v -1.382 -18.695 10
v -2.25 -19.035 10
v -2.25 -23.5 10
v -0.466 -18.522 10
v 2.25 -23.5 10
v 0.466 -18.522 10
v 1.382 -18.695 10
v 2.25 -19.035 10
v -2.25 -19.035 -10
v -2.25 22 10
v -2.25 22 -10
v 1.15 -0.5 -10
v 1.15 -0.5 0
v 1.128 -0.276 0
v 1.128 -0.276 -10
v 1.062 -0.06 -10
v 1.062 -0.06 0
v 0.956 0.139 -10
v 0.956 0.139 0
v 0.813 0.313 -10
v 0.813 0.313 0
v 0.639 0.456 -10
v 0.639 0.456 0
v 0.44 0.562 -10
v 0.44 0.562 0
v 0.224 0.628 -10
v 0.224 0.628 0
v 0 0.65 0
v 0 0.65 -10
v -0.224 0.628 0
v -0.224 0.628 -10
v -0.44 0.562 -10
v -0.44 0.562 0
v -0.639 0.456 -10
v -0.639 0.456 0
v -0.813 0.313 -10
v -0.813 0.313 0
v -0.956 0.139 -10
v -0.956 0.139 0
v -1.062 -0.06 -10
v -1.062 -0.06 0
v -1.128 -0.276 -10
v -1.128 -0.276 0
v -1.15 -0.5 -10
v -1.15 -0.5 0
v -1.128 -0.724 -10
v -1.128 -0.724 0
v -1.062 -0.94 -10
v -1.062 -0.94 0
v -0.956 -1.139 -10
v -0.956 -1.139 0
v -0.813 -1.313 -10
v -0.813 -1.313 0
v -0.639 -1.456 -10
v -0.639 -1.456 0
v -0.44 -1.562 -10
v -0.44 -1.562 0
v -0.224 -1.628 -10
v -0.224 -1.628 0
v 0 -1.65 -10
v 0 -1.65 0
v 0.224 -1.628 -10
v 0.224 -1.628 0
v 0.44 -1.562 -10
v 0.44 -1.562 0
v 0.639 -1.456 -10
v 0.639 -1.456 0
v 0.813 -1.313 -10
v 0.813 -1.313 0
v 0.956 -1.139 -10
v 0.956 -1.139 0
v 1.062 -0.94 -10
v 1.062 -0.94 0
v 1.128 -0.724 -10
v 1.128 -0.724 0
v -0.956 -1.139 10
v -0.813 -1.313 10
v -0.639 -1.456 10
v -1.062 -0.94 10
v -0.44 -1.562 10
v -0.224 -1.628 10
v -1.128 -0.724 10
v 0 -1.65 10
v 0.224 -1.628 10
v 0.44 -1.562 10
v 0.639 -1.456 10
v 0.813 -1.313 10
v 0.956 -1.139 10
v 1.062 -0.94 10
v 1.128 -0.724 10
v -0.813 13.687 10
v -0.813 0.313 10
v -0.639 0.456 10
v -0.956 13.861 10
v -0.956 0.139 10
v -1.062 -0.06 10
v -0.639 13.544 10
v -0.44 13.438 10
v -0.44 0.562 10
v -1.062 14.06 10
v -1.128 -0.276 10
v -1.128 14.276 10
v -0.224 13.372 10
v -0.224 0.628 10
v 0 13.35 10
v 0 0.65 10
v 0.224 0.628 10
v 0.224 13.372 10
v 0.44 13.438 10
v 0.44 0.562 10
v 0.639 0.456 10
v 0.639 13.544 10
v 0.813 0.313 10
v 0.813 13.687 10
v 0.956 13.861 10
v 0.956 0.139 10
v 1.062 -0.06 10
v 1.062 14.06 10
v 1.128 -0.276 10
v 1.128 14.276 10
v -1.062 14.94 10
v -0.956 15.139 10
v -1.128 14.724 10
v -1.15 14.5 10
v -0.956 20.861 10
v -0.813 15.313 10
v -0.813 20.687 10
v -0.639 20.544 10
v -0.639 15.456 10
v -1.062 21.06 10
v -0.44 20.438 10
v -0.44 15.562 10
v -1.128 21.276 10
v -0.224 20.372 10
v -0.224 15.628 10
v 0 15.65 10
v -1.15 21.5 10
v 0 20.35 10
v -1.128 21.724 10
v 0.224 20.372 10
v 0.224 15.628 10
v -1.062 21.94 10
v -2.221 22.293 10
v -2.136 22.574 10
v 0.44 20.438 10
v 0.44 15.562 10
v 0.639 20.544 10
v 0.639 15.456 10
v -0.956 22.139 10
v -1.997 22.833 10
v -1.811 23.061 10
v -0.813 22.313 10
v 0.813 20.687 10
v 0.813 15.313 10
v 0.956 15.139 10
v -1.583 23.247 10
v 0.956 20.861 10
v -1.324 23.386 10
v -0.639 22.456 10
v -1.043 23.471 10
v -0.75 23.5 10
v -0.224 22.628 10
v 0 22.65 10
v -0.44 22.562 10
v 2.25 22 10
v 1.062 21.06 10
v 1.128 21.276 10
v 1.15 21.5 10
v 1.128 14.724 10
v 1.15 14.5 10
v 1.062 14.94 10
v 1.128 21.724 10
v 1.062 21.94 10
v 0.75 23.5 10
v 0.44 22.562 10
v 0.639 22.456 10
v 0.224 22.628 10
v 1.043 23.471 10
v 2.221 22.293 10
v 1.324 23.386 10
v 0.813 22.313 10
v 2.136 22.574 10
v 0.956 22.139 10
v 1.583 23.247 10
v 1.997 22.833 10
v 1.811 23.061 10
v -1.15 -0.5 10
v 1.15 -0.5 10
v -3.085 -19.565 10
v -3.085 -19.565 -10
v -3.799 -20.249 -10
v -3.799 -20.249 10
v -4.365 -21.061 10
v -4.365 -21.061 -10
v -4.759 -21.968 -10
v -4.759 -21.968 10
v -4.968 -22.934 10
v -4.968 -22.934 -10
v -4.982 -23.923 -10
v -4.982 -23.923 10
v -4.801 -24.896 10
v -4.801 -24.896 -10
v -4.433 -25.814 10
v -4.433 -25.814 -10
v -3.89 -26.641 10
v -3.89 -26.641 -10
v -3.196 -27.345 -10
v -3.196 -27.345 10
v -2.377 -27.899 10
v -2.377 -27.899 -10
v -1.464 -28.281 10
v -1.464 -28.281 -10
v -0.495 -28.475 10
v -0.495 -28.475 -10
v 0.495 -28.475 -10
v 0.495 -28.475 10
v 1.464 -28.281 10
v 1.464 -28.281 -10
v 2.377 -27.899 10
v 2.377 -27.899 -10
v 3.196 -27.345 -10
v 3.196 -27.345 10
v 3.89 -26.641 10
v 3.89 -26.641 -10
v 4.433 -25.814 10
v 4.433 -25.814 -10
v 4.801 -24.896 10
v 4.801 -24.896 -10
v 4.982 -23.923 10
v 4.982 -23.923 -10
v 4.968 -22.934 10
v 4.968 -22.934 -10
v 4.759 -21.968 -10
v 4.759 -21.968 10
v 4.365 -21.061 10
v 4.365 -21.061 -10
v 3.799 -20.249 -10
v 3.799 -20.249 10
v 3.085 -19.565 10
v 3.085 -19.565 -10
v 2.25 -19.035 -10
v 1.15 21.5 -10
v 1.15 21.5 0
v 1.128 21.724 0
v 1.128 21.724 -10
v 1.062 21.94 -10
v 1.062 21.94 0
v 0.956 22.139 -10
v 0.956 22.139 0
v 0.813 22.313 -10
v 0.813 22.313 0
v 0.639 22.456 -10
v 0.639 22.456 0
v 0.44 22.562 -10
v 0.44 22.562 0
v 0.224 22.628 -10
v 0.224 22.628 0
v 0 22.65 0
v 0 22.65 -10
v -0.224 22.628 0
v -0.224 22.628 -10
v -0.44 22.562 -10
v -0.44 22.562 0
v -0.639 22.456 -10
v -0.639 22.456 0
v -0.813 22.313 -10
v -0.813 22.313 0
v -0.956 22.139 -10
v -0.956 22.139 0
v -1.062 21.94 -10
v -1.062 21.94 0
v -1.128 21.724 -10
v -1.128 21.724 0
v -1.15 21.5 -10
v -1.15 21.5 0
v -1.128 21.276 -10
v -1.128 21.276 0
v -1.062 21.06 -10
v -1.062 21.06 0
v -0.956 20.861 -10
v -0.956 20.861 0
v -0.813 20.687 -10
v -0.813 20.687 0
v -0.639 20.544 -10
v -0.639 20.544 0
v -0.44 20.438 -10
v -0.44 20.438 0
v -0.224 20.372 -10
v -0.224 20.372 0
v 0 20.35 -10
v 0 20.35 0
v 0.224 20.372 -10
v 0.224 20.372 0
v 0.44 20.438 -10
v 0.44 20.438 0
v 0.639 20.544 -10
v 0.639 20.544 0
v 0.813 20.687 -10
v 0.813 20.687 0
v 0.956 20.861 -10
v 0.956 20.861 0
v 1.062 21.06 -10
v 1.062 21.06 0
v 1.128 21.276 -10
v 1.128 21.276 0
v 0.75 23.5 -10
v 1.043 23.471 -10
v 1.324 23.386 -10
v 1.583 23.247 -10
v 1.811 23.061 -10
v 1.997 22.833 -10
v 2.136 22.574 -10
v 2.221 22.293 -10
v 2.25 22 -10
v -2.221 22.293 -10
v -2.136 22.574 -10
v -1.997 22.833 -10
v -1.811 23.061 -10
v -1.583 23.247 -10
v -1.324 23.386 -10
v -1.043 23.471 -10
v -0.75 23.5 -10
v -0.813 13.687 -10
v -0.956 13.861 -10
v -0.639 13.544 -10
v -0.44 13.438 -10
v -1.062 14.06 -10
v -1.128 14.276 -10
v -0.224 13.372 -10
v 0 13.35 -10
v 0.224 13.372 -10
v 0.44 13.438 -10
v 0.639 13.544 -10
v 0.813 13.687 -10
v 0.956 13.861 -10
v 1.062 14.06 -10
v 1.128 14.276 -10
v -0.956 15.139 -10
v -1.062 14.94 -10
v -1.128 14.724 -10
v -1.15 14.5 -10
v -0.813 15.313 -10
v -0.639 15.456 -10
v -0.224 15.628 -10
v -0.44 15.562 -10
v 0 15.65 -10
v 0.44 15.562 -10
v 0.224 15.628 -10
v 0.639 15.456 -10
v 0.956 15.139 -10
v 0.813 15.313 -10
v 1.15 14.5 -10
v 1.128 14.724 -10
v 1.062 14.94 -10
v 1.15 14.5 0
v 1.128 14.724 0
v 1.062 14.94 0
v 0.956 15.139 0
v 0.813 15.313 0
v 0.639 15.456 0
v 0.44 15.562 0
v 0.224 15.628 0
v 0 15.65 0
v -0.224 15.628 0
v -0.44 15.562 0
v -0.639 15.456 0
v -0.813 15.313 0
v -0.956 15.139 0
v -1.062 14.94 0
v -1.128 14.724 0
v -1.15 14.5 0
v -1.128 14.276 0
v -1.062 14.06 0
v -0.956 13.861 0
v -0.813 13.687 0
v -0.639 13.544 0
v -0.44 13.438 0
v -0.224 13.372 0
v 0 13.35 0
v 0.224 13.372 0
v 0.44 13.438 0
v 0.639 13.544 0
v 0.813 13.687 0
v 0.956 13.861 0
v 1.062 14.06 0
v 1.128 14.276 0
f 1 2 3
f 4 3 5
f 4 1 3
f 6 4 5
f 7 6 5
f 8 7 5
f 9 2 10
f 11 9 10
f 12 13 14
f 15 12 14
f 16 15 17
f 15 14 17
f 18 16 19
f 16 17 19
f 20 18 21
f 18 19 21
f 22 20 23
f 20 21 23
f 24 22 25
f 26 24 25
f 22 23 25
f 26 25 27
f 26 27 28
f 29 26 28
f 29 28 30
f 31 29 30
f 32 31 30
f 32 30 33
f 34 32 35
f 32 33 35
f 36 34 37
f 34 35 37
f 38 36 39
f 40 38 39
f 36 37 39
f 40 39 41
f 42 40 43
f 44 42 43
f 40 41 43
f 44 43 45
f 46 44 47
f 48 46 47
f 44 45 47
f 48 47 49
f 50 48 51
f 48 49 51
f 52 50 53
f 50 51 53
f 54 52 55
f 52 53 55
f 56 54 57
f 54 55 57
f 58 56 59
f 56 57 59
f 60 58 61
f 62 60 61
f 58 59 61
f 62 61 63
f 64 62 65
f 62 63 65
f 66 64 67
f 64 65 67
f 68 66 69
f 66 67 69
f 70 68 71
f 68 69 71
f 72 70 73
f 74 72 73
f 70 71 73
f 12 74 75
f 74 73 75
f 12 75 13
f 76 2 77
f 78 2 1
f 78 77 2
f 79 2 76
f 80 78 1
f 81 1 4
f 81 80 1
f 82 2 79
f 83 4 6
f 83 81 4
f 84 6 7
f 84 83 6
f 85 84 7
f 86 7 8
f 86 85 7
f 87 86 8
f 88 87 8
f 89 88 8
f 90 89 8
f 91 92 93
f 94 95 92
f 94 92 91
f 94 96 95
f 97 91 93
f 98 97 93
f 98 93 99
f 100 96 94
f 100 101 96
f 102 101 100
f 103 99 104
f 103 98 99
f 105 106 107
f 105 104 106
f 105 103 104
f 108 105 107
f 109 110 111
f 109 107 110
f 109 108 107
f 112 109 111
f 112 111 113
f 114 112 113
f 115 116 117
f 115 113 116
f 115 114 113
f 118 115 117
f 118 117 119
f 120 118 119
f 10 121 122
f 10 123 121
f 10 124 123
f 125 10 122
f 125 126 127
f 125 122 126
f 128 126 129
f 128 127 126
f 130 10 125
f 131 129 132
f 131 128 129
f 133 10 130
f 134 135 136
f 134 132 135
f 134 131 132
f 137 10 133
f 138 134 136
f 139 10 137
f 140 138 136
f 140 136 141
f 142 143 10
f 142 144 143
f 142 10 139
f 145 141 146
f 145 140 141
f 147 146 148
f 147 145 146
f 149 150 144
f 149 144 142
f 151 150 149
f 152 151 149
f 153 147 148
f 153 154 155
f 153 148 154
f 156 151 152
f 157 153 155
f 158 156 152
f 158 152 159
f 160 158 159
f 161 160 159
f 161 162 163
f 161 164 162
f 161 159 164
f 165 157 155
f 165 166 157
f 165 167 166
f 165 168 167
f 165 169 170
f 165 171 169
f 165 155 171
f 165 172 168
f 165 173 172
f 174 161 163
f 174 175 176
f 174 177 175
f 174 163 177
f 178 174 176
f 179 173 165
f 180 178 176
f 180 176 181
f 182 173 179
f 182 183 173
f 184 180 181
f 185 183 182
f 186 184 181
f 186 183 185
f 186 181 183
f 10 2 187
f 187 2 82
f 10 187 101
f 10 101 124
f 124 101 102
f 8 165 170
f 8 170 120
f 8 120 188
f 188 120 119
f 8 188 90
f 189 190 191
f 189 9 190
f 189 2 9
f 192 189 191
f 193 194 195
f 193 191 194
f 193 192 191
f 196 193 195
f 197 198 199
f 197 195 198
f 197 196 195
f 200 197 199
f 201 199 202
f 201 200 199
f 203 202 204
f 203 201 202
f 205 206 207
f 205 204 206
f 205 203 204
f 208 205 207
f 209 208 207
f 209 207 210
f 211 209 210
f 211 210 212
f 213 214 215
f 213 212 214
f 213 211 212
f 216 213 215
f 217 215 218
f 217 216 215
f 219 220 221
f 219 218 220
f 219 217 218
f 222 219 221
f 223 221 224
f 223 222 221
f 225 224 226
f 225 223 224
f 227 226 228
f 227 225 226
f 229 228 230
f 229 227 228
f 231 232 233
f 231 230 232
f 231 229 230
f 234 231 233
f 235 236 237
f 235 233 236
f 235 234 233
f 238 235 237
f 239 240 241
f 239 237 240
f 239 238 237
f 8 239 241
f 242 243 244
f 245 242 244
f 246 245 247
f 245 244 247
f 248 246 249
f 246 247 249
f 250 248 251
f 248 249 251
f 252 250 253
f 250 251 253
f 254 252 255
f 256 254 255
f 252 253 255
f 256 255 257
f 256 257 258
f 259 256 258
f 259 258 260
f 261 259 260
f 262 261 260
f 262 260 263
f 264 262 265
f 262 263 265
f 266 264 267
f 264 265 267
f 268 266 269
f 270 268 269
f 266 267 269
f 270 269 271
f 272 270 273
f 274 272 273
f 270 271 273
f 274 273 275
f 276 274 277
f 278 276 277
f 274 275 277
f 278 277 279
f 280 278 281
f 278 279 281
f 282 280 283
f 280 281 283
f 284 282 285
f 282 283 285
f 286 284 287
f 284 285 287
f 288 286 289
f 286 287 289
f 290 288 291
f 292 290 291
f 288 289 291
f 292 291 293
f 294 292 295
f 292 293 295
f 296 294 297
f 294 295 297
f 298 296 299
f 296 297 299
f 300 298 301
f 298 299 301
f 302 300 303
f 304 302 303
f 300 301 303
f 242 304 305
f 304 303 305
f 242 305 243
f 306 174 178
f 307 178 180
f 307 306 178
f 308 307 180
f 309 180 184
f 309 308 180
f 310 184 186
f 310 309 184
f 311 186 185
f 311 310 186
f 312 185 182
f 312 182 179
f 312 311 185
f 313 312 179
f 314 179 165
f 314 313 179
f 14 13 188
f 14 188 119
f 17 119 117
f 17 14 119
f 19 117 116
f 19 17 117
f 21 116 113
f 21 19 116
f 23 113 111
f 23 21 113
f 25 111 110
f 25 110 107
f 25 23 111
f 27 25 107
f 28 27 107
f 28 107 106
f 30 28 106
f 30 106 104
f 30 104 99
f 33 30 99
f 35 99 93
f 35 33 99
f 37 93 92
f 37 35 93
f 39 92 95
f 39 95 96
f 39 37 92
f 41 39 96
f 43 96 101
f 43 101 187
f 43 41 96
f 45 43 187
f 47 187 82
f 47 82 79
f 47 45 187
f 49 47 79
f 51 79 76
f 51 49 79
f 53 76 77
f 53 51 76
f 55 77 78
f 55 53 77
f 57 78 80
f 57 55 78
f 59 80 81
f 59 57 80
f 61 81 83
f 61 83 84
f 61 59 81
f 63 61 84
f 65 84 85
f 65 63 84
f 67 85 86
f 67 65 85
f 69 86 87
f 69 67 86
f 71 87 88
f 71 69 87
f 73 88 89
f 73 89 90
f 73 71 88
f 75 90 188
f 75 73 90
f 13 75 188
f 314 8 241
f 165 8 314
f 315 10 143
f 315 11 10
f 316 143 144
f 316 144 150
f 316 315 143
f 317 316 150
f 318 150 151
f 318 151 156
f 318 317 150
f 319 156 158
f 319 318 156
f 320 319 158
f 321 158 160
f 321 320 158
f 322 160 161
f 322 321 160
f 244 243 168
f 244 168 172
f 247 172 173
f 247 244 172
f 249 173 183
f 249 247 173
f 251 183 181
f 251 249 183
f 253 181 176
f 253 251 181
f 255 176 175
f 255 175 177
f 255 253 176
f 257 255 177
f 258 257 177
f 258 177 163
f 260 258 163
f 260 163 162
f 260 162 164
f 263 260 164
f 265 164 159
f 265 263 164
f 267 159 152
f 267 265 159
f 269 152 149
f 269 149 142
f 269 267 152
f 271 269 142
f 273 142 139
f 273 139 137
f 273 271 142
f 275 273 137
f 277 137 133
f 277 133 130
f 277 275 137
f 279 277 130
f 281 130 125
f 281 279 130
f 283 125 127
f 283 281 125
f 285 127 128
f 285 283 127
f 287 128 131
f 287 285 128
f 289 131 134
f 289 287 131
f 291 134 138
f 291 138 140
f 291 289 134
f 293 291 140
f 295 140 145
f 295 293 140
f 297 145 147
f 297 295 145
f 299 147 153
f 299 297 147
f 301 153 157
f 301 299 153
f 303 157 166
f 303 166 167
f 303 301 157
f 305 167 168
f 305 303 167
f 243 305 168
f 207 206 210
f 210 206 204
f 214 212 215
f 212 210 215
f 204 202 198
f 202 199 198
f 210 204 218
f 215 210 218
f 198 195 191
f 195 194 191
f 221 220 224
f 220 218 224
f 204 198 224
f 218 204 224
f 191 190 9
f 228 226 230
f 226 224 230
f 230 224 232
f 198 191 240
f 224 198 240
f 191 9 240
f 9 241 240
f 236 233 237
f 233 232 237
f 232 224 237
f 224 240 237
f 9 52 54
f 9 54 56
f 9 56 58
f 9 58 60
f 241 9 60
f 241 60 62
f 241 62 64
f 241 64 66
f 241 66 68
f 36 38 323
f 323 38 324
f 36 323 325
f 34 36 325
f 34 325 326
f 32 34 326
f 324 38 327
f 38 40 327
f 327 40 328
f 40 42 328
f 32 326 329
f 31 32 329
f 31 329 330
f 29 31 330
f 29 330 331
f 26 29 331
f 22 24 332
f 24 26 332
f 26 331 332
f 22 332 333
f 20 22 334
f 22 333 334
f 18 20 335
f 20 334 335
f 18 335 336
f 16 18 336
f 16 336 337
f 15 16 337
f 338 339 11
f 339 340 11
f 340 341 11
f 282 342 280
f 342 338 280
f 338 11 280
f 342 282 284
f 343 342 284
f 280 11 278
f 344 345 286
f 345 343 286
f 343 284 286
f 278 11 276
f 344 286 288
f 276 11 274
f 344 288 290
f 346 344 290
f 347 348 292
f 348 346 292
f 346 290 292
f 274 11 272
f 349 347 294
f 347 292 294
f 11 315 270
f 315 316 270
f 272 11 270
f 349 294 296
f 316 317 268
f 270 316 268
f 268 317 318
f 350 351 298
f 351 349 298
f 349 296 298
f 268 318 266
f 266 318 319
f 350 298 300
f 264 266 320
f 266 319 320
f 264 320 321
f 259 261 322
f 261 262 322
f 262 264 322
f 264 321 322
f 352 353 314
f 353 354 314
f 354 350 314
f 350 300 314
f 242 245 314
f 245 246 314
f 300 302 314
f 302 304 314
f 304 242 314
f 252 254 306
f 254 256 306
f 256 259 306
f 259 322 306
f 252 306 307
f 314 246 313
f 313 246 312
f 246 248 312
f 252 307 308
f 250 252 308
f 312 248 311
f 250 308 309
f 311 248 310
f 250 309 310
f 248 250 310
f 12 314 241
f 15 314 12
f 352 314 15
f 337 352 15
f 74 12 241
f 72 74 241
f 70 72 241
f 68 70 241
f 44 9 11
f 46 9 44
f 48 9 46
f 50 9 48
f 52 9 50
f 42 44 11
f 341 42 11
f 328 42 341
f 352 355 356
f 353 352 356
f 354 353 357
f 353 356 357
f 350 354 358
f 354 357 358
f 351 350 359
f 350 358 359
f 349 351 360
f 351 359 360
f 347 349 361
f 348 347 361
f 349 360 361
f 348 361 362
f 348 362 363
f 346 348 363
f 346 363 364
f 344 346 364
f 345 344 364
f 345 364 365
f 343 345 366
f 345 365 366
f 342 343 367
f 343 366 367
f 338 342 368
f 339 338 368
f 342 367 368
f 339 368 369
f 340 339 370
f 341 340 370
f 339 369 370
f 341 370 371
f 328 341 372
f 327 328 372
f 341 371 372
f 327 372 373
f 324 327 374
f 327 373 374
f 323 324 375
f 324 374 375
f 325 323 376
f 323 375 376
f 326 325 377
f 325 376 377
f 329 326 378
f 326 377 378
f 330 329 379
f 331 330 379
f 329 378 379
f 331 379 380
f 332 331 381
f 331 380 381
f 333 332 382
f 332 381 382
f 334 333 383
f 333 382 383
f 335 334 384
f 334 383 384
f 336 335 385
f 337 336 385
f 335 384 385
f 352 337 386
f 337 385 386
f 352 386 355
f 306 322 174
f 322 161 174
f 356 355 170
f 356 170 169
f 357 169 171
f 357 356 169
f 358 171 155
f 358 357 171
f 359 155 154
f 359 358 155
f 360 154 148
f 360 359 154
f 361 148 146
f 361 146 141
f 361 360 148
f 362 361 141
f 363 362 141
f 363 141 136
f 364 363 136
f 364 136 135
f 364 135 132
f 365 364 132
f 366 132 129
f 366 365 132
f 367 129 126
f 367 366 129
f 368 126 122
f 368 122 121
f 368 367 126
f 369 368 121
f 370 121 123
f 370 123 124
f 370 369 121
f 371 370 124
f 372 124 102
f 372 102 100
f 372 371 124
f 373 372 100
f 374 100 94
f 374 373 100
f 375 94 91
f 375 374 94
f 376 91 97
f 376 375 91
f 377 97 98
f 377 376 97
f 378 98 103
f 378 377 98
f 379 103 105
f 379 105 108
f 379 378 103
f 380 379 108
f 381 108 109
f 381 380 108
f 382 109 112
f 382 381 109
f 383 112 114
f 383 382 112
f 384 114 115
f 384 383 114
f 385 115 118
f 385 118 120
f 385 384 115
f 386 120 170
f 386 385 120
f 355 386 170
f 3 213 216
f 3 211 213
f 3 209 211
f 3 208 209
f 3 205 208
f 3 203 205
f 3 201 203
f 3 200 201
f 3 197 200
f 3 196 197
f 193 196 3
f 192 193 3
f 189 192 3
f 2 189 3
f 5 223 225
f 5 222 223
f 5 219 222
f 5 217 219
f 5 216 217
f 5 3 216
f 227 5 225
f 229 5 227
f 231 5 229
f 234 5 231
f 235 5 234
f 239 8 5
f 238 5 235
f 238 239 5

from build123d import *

# Parameters (mm, degrees)
SKETCH_1_R      = 5
SKETCH_1_W      = 4.5
SKETCH_1_H      = 47
SKETCH_1_R_2    = 1.15
EXTRUDE_1_DEPTH = 10
FILLET_1_R      = 1.5


with BuildPart() as part:
    # 草图1 → 凸台-拉伸1 (new, symmetric)
    # profile 1 of 2: a face of its own
    with BuildSketch(Plane.XY):
        with Locations((0, -23.5)):
            Circle(SKETCH_1_R)
    # profile 2 of 2: a face of its own
    with BuildSketch(Plane.XY):
        Rectangle(SKETCH_1_W, SKETCH_1_H)
        with Locations((0, -0.5)):
            Circle(SKETCH_1_R_2, mode=Mode.SUBTRACT)
        with Locations((0, 14.5)):
            Circle(SKETCH_1_R_2, mode=Mode.SUBTRACT)
        with Locations((0, 21.5)):
            Circle(SKETCH_1_R_2, mode=Mode.SUBTRACT)
    extrude(amount=EXTRUDE_1_DEPTH, both=True)

    # 圆角1
    fillet_1_edges = [part.edges().sort_by_distance(p)[0] for p in [
        (-2.25, 23.5, 0),
        (2.25, 23.5, 0),
    ]]
    fillet(fillet_1_edges, radius=FILLET_1_R)


solid = part.part
